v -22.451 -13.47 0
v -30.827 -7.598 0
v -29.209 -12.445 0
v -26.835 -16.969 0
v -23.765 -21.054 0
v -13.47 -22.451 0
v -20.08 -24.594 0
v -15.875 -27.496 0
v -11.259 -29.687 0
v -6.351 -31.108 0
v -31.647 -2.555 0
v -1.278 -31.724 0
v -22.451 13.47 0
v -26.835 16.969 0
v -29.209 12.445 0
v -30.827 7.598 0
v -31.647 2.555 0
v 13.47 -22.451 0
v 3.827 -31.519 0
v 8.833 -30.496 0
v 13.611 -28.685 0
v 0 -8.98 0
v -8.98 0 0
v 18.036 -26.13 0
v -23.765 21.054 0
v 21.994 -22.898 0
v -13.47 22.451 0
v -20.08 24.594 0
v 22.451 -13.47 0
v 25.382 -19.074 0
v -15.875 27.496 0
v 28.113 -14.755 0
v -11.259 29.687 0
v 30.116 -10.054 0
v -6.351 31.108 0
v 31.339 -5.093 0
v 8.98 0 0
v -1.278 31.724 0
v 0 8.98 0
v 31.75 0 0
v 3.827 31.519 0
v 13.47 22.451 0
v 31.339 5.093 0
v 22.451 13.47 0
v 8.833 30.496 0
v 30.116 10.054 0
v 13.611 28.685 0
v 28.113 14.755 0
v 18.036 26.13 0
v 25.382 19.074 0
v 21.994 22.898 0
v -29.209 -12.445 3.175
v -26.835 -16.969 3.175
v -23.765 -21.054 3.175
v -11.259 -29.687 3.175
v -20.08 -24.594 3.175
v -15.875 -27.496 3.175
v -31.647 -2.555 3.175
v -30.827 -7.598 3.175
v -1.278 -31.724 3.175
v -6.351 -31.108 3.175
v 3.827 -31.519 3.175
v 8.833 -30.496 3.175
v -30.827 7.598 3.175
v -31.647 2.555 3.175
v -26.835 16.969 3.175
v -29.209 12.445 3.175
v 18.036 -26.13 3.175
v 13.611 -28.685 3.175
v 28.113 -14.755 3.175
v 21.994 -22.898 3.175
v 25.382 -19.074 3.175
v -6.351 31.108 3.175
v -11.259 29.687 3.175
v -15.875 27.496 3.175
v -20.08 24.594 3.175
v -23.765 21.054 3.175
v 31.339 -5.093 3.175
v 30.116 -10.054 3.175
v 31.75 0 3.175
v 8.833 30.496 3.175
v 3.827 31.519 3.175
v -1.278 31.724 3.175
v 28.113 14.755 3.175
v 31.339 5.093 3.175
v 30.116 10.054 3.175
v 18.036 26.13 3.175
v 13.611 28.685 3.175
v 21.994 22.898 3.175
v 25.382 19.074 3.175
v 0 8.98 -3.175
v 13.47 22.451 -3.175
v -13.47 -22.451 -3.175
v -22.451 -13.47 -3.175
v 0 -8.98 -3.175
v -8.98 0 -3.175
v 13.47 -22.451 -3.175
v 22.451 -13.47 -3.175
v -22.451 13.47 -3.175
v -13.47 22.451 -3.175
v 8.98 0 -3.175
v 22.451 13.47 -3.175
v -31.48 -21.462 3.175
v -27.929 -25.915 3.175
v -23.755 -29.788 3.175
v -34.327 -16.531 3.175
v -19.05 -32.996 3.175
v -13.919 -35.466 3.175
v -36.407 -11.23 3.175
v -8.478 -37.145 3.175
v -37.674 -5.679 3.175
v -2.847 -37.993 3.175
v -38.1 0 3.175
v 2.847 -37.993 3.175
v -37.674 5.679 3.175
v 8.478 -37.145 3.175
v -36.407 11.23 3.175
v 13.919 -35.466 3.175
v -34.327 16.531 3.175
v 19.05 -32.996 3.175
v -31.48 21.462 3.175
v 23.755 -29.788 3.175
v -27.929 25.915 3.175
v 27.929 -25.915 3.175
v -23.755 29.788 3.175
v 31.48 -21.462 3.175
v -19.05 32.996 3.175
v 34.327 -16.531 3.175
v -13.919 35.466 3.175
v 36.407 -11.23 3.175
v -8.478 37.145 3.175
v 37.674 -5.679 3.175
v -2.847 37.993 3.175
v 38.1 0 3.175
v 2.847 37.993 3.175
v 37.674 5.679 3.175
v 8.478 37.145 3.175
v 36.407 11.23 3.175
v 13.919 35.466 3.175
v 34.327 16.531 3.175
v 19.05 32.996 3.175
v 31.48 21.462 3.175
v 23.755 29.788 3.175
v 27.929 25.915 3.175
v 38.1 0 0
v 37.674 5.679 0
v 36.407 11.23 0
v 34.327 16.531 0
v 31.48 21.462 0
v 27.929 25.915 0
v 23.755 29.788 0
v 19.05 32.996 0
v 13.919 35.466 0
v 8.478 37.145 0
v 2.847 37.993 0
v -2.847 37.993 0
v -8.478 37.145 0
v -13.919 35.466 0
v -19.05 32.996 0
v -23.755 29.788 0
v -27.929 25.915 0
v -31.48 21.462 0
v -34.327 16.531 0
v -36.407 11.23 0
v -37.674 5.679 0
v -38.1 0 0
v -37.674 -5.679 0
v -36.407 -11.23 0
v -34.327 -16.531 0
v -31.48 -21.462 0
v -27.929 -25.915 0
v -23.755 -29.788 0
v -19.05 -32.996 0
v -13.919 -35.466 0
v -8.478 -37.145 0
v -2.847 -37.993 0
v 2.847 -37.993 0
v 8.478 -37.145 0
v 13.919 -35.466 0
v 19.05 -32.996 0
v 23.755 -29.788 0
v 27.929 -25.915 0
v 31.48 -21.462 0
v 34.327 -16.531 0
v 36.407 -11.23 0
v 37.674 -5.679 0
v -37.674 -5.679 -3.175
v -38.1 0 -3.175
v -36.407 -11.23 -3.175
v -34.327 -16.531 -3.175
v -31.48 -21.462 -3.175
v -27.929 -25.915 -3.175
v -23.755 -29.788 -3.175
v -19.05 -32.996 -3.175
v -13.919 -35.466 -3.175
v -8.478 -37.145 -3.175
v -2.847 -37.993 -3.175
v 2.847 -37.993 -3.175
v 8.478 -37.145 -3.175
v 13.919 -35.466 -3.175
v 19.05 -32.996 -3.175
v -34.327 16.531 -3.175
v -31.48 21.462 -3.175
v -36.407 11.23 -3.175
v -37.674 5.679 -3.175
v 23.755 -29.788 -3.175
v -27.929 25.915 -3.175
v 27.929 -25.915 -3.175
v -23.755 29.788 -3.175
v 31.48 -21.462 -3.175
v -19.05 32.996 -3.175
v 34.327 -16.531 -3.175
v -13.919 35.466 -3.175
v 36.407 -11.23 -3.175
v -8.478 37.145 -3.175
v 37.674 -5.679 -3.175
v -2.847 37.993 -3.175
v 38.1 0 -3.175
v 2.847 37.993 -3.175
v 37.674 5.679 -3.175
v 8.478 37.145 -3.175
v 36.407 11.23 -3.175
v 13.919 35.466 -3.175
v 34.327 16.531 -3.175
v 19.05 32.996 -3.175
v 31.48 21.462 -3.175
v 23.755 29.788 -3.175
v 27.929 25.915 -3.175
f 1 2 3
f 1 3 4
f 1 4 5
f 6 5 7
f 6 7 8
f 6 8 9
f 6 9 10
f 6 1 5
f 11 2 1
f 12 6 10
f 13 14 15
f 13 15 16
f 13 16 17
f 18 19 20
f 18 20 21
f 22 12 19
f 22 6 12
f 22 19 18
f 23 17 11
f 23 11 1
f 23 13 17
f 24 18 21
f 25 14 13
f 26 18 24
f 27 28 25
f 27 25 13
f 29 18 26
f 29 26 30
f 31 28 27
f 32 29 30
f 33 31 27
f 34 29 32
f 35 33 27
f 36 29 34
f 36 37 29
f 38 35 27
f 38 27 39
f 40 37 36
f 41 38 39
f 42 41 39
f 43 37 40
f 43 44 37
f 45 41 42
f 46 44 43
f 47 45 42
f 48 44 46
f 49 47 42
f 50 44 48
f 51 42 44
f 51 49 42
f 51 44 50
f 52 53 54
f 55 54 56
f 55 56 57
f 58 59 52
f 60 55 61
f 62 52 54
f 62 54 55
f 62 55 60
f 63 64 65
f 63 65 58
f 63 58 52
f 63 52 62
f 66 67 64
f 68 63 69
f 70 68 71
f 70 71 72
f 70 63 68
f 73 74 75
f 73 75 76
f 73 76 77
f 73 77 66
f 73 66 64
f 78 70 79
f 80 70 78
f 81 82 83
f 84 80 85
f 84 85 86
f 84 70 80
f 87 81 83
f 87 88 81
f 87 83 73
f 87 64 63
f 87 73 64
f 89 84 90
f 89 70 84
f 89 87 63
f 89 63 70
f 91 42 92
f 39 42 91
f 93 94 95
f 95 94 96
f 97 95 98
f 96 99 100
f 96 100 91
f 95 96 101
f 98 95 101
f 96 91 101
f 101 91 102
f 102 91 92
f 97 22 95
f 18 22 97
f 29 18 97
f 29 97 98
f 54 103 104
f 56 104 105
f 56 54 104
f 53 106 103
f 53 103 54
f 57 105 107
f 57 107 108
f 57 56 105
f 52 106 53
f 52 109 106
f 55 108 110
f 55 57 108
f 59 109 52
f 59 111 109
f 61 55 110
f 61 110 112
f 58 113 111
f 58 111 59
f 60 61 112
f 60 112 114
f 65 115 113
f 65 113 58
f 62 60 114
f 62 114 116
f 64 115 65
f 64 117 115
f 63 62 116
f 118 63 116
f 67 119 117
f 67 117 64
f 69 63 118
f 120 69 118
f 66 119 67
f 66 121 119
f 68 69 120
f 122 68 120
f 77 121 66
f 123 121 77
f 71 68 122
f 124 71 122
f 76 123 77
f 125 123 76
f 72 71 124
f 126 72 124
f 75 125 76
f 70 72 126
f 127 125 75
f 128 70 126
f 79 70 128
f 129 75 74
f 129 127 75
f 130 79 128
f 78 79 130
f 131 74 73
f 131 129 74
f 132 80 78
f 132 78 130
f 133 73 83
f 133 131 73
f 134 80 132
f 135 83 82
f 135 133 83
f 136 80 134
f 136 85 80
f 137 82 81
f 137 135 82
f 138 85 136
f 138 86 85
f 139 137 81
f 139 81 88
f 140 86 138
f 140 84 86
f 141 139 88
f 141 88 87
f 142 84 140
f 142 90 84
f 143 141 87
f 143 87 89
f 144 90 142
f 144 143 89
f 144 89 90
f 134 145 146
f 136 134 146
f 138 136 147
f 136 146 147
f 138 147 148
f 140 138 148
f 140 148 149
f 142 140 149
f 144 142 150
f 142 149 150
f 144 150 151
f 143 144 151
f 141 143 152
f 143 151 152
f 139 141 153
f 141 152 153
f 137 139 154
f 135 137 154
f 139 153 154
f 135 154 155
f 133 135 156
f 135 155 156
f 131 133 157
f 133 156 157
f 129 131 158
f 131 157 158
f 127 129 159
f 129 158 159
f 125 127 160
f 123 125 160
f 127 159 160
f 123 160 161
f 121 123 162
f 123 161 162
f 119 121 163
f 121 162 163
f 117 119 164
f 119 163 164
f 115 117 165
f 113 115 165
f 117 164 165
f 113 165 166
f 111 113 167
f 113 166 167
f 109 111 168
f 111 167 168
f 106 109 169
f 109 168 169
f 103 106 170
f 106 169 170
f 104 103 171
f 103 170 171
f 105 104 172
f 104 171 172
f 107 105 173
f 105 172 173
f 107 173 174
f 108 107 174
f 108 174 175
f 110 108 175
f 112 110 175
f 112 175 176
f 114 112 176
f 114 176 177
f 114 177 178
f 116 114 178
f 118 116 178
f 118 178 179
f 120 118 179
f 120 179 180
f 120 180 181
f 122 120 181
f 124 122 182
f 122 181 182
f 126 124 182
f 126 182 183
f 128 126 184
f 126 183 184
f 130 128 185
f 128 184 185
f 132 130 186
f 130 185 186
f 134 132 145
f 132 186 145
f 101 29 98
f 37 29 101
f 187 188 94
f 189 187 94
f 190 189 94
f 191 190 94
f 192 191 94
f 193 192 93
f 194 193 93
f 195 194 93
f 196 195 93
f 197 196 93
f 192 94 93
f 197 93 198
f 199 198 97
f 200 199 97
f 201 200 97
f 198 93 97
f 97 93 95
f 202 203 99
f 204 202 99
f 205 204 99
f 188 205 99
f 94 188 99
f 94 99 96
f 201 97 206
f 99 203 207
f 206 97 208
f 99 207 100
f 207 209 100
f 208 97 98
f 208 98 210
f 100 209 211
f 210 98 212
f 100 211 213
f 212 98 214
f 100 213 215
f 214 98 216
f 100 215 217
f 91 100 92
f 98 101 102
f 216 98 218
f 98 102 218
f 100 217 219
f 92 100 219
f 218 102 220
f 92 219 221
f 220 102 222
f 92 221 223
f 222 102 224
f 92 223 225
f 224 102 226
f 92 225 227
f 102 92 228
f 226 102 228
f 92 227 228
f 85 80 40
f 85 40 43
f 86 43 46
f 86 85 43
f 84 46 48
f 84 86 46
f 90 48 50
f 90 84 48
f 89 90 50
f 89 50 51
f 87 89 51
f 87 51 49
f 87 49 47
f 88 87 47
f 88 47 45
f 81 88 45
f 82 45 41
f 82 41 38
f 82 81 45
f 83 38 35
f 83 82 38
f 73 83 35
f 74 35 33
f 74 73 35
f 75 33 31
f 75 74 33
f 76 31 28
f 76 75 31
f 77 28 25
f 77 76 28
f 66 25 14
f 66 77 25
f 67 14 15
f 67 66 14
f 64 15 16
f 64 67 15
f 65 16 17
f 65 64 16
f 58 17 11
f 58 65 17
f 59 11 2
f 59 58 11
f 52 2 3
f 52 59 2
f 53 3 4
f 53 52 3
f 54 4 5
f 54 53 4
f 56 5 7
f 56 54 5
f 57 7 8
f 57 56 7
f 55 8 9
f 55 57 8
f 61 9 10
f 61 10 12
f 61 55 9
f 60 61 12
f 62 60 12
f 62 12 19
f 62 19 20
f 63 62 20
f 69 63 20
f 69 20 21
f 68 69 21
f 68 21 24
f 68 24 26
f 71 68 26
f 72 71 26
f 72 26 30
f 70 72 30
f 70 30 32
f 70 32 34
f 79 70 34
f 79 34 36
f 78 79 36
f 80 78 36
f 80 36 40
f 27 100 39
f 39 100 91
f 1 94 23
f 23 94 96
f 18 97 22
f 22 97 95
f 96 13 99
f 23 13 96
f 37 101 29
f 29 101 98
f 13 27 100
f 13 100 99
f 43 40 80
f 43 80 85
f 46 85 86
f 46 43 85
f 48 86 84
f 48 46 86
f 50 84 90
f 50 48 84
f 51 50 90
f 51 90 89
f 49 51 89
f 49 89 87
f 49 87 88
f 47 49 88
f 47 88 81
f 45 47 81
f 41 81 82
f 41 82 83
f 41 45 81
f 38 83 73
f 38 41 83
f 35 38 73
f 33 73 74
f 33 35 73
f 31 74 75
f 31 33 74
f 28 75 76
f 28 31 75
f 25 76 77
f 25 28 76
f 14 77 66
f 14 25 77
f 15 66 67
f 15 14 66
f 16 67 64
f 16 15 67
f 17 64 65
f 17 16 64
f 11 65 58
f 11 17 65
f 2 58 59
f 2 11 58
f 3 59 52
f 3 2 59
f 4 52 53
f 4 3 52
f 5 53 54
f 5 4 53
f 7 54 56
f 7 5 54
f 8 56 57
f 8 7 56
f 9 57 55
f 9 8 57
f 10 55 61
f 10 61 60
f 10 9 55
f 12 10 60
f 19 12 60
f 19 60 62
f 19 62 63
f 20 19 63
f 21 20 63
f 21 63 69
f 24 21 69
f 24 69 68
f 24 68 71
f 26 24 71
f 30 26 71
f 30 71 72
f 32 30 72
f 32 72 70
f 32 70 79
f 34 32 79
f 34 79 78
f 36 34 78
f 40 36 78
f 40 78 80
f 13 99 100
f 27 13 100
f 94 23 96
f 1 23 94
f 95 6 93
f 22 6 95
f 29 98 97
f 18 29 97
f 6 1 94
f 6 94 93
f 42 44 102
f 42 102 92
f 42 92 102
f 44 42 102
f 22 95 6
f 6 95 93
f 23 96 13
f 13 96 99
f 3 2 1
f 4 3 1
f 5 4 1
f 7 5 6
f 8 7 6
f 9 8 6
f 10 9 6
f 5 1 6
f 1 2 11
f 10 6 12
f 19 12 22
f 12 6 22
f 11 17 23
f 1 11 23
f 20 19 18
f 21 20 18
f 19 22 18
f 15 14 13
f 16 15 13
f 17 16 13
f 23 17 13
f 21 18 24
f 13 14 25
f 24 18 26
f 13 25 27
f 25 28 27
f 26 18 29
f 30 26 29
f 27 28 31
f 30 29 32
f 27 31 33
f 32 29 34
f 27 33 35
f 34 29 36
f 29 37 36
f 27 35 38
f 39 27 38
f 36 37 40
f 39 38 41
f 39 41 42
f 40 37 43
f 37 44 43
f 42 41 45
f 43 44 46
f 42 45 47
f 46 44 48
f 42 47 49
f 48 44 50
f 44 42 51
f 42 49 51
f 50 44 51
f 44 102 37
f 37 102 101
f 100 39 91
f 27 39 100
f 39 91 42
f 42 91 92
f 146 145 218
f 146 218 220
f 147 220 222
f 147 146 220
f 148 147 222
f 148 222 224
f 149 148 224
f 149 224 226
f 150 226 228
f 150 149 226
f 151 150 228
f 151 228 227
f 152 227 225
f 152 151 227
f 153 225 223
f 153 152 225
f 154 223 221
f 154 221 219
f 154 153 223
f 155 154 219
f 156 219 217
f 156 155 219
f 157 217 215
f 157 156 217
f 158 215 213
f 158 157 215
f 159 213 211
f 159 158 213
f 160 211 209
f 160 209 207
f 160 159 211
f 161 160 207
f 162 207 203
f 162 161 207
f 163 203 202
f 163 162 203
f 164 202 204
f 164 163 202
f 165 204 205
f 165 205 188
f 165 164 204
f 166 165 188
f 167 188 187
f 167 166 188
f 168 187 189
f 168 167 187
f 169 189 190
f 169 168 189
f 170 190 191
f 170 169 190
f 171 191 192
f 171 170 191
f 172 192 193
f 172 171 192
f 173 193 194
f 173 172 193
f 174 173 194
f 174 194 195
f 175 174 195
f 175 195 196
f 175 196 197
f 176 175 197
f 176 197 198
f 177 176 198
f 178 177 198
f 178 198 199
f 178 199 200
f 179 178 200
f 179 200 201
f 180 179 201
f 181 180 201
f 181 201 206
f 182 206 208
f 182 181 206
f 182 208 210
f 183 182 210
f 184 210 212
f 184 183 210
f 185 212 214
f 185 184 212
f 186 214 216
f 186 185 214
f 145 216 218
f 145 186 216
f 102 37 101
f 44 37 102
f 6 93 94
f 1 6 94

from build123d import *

# Parameters (mm, degrees)
F0_R      = 38.1
F1_DEPTH  = 3.175
F2_DEPTH  = 3.175
F3_R      = 38.1
F3_R_2    = 31.75
F4_DEPTH  = 3.175
F5_R      = 38.1
F5_R_2    = 31.75
F6_DEPTH  = 3.175
F8_DEPTH  = 3.175
F10_DEPTH = 3.175


with BuildPart() as f1:
    # F0 (on Top) → F1 (new body)
    with BuildSketch(Plane.XY):
        Circle(F0_R)
    extrude(amount=F1_DEPTH)

    # F3 (on face) → F4 (cut, through all)
    with BuildSketch(Plane.XY.offset(3.175)):
        Circle(F3_R)
        Circle(F3_R_2, mode=Mode.SUBTRACT)
    extrude(amount=-F4_DEPTH, mode=Mode.SUBTRACT)

    # F9 (on face) → F10 (join, through all)
    with BuildSketch(Plane.XY):
        Polygon((-13.4703841816, -22.4506403027), (0, -8.9802561211), (13.4703841816, -22.4506403027), (22.4506403027, -13.4703841816), (8.9802561211, 0), (22.4506403027, 13.4703841816), (13.4703841816, 22.4506403027), (0, 8.9802561211), (-13.4703841816, 22.4506403027), (-22.4506403027, 13.4703841816), (-8.9802561211, 0), (-22.4506403027, -13.4703841816), align=None)
    extrude(amount=-F10_DEPTH)


with BuildPart() as f2:
    # F0 (on Top) → F2 (new body)
    with BuildSketch(Plane.XY):
        Circle(F0_R)
    extrude(amount=-F2_DEPTH)

    # F5 (on face) → F6 (join, through all)
    with BuildSketch(Plane.XY):
        Circle(F5_R)
        Circle(F5_R_2, mode=Mode.SUBTRACT)
    extrude(amount=F6_DEPTH)

    # F7 (on face) → F8 (cut, through all)
    with BuildSketch(Plane(origin=(0, 0, -3.175), x_dir=(1, 0, 0), z_dir=(0, 0, -1))):
        Polygon((13.4703841816, 22.4506403027), (0, 8.9802561211), (-13.4703841816, 22.4506403027), (-22.4506403027, 13.4703841816), (-8.9802561211, 0), (-22.4506403027, -13.4703841816), (-13.4703841816, -22.4506403027), (0, -8.9802561211), (13.4703841816, -22.4506403027), (22.4506403027, -13.4703841816), (8.9802561211, 0), (22.4506403027, 13.4703841816), align=None)
    extrude(amount=-F8_DEPTH, mode=Mode.SUBTRACT)


solid = Compound([f1.part, f2.part])
